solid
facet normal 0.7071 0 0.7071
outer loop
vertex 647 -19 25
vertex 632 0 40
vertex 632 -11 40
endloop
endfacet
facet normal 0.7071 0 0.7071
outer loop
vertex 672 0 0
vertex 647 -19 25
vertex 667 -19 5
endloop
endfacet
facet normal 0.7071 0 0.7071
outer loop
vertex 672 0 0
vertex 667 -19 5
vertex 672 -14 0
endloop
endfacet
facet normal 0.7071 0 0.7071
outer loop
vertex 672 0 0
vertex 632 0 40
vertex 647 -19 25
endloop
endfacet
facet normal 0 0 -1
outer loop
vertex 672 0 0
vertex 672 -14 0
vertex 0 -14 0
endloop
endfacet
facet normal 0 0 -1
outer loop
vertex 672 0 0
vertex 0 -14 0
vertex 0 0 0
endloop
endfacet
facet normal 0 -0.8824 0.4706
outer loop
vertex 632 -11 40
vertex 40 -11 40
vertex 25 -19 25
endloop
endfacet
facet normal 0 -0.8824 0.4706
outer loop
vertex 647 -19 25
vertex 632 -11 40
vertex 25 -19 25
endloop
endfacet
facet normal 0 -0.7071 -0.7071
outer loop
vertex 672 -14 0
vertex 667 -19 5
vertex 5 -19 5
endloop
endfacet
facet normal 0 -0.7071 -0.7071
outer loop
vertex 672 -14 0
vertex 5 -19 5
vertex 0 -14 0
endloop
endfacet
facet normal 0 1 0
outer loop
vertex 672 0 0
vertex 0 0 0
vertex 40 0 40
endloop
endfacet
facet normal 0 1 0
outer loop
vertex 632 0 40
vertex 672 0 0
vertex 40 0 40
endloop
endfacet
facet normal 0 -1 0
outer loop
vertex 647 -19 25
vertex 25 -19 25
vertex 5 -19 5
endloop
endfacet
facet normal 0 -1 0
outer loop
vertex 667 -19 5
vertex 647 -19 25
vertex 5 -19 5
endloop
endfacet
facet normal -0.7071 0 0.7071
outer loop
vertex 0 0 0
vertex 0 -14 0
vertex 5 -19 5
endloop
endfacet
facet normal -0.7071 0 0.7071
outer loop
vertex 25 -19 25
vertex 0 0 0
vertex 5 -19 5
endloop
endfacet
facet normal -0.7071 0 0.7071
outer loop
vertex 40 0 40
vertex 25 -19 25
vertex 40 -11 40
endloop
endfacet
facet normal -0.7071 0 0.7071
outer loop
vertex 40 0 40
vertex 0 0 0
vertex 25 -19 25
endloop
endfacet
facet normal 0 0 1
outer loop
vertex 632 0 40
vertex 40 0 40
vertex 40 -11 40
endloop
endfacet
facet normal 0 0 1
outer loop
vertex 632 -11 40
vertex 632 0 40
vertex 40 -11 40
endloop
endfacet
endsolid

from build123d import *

# Parameters (mm, degrees)
F1_DEPTH = 672
F3_DEPTH = 25


with BuildPart() as f1:
    # F0 (on Right) → F1 (new body)
    with BuildSketch(Plane.YZ):
        Polygon((-14, 0), (0, 0), (0, 40), (-11, 40), (-19, 25), (-19, 5), align=None)
    extrude(amount=F1_DEPTH)

    # F2 (on Front) → F3 (cut)
    with BuildSketch(Plane.XZ):
        Polygon((0, 40), (0, 0), (40, 40), align=None)
        Polygon((672, 40), (632, 40), (672, 0), align=None)
    extrude(amount=F3_DEPTH, mode=Mode.SUBTRACT)


solid = f1.part
